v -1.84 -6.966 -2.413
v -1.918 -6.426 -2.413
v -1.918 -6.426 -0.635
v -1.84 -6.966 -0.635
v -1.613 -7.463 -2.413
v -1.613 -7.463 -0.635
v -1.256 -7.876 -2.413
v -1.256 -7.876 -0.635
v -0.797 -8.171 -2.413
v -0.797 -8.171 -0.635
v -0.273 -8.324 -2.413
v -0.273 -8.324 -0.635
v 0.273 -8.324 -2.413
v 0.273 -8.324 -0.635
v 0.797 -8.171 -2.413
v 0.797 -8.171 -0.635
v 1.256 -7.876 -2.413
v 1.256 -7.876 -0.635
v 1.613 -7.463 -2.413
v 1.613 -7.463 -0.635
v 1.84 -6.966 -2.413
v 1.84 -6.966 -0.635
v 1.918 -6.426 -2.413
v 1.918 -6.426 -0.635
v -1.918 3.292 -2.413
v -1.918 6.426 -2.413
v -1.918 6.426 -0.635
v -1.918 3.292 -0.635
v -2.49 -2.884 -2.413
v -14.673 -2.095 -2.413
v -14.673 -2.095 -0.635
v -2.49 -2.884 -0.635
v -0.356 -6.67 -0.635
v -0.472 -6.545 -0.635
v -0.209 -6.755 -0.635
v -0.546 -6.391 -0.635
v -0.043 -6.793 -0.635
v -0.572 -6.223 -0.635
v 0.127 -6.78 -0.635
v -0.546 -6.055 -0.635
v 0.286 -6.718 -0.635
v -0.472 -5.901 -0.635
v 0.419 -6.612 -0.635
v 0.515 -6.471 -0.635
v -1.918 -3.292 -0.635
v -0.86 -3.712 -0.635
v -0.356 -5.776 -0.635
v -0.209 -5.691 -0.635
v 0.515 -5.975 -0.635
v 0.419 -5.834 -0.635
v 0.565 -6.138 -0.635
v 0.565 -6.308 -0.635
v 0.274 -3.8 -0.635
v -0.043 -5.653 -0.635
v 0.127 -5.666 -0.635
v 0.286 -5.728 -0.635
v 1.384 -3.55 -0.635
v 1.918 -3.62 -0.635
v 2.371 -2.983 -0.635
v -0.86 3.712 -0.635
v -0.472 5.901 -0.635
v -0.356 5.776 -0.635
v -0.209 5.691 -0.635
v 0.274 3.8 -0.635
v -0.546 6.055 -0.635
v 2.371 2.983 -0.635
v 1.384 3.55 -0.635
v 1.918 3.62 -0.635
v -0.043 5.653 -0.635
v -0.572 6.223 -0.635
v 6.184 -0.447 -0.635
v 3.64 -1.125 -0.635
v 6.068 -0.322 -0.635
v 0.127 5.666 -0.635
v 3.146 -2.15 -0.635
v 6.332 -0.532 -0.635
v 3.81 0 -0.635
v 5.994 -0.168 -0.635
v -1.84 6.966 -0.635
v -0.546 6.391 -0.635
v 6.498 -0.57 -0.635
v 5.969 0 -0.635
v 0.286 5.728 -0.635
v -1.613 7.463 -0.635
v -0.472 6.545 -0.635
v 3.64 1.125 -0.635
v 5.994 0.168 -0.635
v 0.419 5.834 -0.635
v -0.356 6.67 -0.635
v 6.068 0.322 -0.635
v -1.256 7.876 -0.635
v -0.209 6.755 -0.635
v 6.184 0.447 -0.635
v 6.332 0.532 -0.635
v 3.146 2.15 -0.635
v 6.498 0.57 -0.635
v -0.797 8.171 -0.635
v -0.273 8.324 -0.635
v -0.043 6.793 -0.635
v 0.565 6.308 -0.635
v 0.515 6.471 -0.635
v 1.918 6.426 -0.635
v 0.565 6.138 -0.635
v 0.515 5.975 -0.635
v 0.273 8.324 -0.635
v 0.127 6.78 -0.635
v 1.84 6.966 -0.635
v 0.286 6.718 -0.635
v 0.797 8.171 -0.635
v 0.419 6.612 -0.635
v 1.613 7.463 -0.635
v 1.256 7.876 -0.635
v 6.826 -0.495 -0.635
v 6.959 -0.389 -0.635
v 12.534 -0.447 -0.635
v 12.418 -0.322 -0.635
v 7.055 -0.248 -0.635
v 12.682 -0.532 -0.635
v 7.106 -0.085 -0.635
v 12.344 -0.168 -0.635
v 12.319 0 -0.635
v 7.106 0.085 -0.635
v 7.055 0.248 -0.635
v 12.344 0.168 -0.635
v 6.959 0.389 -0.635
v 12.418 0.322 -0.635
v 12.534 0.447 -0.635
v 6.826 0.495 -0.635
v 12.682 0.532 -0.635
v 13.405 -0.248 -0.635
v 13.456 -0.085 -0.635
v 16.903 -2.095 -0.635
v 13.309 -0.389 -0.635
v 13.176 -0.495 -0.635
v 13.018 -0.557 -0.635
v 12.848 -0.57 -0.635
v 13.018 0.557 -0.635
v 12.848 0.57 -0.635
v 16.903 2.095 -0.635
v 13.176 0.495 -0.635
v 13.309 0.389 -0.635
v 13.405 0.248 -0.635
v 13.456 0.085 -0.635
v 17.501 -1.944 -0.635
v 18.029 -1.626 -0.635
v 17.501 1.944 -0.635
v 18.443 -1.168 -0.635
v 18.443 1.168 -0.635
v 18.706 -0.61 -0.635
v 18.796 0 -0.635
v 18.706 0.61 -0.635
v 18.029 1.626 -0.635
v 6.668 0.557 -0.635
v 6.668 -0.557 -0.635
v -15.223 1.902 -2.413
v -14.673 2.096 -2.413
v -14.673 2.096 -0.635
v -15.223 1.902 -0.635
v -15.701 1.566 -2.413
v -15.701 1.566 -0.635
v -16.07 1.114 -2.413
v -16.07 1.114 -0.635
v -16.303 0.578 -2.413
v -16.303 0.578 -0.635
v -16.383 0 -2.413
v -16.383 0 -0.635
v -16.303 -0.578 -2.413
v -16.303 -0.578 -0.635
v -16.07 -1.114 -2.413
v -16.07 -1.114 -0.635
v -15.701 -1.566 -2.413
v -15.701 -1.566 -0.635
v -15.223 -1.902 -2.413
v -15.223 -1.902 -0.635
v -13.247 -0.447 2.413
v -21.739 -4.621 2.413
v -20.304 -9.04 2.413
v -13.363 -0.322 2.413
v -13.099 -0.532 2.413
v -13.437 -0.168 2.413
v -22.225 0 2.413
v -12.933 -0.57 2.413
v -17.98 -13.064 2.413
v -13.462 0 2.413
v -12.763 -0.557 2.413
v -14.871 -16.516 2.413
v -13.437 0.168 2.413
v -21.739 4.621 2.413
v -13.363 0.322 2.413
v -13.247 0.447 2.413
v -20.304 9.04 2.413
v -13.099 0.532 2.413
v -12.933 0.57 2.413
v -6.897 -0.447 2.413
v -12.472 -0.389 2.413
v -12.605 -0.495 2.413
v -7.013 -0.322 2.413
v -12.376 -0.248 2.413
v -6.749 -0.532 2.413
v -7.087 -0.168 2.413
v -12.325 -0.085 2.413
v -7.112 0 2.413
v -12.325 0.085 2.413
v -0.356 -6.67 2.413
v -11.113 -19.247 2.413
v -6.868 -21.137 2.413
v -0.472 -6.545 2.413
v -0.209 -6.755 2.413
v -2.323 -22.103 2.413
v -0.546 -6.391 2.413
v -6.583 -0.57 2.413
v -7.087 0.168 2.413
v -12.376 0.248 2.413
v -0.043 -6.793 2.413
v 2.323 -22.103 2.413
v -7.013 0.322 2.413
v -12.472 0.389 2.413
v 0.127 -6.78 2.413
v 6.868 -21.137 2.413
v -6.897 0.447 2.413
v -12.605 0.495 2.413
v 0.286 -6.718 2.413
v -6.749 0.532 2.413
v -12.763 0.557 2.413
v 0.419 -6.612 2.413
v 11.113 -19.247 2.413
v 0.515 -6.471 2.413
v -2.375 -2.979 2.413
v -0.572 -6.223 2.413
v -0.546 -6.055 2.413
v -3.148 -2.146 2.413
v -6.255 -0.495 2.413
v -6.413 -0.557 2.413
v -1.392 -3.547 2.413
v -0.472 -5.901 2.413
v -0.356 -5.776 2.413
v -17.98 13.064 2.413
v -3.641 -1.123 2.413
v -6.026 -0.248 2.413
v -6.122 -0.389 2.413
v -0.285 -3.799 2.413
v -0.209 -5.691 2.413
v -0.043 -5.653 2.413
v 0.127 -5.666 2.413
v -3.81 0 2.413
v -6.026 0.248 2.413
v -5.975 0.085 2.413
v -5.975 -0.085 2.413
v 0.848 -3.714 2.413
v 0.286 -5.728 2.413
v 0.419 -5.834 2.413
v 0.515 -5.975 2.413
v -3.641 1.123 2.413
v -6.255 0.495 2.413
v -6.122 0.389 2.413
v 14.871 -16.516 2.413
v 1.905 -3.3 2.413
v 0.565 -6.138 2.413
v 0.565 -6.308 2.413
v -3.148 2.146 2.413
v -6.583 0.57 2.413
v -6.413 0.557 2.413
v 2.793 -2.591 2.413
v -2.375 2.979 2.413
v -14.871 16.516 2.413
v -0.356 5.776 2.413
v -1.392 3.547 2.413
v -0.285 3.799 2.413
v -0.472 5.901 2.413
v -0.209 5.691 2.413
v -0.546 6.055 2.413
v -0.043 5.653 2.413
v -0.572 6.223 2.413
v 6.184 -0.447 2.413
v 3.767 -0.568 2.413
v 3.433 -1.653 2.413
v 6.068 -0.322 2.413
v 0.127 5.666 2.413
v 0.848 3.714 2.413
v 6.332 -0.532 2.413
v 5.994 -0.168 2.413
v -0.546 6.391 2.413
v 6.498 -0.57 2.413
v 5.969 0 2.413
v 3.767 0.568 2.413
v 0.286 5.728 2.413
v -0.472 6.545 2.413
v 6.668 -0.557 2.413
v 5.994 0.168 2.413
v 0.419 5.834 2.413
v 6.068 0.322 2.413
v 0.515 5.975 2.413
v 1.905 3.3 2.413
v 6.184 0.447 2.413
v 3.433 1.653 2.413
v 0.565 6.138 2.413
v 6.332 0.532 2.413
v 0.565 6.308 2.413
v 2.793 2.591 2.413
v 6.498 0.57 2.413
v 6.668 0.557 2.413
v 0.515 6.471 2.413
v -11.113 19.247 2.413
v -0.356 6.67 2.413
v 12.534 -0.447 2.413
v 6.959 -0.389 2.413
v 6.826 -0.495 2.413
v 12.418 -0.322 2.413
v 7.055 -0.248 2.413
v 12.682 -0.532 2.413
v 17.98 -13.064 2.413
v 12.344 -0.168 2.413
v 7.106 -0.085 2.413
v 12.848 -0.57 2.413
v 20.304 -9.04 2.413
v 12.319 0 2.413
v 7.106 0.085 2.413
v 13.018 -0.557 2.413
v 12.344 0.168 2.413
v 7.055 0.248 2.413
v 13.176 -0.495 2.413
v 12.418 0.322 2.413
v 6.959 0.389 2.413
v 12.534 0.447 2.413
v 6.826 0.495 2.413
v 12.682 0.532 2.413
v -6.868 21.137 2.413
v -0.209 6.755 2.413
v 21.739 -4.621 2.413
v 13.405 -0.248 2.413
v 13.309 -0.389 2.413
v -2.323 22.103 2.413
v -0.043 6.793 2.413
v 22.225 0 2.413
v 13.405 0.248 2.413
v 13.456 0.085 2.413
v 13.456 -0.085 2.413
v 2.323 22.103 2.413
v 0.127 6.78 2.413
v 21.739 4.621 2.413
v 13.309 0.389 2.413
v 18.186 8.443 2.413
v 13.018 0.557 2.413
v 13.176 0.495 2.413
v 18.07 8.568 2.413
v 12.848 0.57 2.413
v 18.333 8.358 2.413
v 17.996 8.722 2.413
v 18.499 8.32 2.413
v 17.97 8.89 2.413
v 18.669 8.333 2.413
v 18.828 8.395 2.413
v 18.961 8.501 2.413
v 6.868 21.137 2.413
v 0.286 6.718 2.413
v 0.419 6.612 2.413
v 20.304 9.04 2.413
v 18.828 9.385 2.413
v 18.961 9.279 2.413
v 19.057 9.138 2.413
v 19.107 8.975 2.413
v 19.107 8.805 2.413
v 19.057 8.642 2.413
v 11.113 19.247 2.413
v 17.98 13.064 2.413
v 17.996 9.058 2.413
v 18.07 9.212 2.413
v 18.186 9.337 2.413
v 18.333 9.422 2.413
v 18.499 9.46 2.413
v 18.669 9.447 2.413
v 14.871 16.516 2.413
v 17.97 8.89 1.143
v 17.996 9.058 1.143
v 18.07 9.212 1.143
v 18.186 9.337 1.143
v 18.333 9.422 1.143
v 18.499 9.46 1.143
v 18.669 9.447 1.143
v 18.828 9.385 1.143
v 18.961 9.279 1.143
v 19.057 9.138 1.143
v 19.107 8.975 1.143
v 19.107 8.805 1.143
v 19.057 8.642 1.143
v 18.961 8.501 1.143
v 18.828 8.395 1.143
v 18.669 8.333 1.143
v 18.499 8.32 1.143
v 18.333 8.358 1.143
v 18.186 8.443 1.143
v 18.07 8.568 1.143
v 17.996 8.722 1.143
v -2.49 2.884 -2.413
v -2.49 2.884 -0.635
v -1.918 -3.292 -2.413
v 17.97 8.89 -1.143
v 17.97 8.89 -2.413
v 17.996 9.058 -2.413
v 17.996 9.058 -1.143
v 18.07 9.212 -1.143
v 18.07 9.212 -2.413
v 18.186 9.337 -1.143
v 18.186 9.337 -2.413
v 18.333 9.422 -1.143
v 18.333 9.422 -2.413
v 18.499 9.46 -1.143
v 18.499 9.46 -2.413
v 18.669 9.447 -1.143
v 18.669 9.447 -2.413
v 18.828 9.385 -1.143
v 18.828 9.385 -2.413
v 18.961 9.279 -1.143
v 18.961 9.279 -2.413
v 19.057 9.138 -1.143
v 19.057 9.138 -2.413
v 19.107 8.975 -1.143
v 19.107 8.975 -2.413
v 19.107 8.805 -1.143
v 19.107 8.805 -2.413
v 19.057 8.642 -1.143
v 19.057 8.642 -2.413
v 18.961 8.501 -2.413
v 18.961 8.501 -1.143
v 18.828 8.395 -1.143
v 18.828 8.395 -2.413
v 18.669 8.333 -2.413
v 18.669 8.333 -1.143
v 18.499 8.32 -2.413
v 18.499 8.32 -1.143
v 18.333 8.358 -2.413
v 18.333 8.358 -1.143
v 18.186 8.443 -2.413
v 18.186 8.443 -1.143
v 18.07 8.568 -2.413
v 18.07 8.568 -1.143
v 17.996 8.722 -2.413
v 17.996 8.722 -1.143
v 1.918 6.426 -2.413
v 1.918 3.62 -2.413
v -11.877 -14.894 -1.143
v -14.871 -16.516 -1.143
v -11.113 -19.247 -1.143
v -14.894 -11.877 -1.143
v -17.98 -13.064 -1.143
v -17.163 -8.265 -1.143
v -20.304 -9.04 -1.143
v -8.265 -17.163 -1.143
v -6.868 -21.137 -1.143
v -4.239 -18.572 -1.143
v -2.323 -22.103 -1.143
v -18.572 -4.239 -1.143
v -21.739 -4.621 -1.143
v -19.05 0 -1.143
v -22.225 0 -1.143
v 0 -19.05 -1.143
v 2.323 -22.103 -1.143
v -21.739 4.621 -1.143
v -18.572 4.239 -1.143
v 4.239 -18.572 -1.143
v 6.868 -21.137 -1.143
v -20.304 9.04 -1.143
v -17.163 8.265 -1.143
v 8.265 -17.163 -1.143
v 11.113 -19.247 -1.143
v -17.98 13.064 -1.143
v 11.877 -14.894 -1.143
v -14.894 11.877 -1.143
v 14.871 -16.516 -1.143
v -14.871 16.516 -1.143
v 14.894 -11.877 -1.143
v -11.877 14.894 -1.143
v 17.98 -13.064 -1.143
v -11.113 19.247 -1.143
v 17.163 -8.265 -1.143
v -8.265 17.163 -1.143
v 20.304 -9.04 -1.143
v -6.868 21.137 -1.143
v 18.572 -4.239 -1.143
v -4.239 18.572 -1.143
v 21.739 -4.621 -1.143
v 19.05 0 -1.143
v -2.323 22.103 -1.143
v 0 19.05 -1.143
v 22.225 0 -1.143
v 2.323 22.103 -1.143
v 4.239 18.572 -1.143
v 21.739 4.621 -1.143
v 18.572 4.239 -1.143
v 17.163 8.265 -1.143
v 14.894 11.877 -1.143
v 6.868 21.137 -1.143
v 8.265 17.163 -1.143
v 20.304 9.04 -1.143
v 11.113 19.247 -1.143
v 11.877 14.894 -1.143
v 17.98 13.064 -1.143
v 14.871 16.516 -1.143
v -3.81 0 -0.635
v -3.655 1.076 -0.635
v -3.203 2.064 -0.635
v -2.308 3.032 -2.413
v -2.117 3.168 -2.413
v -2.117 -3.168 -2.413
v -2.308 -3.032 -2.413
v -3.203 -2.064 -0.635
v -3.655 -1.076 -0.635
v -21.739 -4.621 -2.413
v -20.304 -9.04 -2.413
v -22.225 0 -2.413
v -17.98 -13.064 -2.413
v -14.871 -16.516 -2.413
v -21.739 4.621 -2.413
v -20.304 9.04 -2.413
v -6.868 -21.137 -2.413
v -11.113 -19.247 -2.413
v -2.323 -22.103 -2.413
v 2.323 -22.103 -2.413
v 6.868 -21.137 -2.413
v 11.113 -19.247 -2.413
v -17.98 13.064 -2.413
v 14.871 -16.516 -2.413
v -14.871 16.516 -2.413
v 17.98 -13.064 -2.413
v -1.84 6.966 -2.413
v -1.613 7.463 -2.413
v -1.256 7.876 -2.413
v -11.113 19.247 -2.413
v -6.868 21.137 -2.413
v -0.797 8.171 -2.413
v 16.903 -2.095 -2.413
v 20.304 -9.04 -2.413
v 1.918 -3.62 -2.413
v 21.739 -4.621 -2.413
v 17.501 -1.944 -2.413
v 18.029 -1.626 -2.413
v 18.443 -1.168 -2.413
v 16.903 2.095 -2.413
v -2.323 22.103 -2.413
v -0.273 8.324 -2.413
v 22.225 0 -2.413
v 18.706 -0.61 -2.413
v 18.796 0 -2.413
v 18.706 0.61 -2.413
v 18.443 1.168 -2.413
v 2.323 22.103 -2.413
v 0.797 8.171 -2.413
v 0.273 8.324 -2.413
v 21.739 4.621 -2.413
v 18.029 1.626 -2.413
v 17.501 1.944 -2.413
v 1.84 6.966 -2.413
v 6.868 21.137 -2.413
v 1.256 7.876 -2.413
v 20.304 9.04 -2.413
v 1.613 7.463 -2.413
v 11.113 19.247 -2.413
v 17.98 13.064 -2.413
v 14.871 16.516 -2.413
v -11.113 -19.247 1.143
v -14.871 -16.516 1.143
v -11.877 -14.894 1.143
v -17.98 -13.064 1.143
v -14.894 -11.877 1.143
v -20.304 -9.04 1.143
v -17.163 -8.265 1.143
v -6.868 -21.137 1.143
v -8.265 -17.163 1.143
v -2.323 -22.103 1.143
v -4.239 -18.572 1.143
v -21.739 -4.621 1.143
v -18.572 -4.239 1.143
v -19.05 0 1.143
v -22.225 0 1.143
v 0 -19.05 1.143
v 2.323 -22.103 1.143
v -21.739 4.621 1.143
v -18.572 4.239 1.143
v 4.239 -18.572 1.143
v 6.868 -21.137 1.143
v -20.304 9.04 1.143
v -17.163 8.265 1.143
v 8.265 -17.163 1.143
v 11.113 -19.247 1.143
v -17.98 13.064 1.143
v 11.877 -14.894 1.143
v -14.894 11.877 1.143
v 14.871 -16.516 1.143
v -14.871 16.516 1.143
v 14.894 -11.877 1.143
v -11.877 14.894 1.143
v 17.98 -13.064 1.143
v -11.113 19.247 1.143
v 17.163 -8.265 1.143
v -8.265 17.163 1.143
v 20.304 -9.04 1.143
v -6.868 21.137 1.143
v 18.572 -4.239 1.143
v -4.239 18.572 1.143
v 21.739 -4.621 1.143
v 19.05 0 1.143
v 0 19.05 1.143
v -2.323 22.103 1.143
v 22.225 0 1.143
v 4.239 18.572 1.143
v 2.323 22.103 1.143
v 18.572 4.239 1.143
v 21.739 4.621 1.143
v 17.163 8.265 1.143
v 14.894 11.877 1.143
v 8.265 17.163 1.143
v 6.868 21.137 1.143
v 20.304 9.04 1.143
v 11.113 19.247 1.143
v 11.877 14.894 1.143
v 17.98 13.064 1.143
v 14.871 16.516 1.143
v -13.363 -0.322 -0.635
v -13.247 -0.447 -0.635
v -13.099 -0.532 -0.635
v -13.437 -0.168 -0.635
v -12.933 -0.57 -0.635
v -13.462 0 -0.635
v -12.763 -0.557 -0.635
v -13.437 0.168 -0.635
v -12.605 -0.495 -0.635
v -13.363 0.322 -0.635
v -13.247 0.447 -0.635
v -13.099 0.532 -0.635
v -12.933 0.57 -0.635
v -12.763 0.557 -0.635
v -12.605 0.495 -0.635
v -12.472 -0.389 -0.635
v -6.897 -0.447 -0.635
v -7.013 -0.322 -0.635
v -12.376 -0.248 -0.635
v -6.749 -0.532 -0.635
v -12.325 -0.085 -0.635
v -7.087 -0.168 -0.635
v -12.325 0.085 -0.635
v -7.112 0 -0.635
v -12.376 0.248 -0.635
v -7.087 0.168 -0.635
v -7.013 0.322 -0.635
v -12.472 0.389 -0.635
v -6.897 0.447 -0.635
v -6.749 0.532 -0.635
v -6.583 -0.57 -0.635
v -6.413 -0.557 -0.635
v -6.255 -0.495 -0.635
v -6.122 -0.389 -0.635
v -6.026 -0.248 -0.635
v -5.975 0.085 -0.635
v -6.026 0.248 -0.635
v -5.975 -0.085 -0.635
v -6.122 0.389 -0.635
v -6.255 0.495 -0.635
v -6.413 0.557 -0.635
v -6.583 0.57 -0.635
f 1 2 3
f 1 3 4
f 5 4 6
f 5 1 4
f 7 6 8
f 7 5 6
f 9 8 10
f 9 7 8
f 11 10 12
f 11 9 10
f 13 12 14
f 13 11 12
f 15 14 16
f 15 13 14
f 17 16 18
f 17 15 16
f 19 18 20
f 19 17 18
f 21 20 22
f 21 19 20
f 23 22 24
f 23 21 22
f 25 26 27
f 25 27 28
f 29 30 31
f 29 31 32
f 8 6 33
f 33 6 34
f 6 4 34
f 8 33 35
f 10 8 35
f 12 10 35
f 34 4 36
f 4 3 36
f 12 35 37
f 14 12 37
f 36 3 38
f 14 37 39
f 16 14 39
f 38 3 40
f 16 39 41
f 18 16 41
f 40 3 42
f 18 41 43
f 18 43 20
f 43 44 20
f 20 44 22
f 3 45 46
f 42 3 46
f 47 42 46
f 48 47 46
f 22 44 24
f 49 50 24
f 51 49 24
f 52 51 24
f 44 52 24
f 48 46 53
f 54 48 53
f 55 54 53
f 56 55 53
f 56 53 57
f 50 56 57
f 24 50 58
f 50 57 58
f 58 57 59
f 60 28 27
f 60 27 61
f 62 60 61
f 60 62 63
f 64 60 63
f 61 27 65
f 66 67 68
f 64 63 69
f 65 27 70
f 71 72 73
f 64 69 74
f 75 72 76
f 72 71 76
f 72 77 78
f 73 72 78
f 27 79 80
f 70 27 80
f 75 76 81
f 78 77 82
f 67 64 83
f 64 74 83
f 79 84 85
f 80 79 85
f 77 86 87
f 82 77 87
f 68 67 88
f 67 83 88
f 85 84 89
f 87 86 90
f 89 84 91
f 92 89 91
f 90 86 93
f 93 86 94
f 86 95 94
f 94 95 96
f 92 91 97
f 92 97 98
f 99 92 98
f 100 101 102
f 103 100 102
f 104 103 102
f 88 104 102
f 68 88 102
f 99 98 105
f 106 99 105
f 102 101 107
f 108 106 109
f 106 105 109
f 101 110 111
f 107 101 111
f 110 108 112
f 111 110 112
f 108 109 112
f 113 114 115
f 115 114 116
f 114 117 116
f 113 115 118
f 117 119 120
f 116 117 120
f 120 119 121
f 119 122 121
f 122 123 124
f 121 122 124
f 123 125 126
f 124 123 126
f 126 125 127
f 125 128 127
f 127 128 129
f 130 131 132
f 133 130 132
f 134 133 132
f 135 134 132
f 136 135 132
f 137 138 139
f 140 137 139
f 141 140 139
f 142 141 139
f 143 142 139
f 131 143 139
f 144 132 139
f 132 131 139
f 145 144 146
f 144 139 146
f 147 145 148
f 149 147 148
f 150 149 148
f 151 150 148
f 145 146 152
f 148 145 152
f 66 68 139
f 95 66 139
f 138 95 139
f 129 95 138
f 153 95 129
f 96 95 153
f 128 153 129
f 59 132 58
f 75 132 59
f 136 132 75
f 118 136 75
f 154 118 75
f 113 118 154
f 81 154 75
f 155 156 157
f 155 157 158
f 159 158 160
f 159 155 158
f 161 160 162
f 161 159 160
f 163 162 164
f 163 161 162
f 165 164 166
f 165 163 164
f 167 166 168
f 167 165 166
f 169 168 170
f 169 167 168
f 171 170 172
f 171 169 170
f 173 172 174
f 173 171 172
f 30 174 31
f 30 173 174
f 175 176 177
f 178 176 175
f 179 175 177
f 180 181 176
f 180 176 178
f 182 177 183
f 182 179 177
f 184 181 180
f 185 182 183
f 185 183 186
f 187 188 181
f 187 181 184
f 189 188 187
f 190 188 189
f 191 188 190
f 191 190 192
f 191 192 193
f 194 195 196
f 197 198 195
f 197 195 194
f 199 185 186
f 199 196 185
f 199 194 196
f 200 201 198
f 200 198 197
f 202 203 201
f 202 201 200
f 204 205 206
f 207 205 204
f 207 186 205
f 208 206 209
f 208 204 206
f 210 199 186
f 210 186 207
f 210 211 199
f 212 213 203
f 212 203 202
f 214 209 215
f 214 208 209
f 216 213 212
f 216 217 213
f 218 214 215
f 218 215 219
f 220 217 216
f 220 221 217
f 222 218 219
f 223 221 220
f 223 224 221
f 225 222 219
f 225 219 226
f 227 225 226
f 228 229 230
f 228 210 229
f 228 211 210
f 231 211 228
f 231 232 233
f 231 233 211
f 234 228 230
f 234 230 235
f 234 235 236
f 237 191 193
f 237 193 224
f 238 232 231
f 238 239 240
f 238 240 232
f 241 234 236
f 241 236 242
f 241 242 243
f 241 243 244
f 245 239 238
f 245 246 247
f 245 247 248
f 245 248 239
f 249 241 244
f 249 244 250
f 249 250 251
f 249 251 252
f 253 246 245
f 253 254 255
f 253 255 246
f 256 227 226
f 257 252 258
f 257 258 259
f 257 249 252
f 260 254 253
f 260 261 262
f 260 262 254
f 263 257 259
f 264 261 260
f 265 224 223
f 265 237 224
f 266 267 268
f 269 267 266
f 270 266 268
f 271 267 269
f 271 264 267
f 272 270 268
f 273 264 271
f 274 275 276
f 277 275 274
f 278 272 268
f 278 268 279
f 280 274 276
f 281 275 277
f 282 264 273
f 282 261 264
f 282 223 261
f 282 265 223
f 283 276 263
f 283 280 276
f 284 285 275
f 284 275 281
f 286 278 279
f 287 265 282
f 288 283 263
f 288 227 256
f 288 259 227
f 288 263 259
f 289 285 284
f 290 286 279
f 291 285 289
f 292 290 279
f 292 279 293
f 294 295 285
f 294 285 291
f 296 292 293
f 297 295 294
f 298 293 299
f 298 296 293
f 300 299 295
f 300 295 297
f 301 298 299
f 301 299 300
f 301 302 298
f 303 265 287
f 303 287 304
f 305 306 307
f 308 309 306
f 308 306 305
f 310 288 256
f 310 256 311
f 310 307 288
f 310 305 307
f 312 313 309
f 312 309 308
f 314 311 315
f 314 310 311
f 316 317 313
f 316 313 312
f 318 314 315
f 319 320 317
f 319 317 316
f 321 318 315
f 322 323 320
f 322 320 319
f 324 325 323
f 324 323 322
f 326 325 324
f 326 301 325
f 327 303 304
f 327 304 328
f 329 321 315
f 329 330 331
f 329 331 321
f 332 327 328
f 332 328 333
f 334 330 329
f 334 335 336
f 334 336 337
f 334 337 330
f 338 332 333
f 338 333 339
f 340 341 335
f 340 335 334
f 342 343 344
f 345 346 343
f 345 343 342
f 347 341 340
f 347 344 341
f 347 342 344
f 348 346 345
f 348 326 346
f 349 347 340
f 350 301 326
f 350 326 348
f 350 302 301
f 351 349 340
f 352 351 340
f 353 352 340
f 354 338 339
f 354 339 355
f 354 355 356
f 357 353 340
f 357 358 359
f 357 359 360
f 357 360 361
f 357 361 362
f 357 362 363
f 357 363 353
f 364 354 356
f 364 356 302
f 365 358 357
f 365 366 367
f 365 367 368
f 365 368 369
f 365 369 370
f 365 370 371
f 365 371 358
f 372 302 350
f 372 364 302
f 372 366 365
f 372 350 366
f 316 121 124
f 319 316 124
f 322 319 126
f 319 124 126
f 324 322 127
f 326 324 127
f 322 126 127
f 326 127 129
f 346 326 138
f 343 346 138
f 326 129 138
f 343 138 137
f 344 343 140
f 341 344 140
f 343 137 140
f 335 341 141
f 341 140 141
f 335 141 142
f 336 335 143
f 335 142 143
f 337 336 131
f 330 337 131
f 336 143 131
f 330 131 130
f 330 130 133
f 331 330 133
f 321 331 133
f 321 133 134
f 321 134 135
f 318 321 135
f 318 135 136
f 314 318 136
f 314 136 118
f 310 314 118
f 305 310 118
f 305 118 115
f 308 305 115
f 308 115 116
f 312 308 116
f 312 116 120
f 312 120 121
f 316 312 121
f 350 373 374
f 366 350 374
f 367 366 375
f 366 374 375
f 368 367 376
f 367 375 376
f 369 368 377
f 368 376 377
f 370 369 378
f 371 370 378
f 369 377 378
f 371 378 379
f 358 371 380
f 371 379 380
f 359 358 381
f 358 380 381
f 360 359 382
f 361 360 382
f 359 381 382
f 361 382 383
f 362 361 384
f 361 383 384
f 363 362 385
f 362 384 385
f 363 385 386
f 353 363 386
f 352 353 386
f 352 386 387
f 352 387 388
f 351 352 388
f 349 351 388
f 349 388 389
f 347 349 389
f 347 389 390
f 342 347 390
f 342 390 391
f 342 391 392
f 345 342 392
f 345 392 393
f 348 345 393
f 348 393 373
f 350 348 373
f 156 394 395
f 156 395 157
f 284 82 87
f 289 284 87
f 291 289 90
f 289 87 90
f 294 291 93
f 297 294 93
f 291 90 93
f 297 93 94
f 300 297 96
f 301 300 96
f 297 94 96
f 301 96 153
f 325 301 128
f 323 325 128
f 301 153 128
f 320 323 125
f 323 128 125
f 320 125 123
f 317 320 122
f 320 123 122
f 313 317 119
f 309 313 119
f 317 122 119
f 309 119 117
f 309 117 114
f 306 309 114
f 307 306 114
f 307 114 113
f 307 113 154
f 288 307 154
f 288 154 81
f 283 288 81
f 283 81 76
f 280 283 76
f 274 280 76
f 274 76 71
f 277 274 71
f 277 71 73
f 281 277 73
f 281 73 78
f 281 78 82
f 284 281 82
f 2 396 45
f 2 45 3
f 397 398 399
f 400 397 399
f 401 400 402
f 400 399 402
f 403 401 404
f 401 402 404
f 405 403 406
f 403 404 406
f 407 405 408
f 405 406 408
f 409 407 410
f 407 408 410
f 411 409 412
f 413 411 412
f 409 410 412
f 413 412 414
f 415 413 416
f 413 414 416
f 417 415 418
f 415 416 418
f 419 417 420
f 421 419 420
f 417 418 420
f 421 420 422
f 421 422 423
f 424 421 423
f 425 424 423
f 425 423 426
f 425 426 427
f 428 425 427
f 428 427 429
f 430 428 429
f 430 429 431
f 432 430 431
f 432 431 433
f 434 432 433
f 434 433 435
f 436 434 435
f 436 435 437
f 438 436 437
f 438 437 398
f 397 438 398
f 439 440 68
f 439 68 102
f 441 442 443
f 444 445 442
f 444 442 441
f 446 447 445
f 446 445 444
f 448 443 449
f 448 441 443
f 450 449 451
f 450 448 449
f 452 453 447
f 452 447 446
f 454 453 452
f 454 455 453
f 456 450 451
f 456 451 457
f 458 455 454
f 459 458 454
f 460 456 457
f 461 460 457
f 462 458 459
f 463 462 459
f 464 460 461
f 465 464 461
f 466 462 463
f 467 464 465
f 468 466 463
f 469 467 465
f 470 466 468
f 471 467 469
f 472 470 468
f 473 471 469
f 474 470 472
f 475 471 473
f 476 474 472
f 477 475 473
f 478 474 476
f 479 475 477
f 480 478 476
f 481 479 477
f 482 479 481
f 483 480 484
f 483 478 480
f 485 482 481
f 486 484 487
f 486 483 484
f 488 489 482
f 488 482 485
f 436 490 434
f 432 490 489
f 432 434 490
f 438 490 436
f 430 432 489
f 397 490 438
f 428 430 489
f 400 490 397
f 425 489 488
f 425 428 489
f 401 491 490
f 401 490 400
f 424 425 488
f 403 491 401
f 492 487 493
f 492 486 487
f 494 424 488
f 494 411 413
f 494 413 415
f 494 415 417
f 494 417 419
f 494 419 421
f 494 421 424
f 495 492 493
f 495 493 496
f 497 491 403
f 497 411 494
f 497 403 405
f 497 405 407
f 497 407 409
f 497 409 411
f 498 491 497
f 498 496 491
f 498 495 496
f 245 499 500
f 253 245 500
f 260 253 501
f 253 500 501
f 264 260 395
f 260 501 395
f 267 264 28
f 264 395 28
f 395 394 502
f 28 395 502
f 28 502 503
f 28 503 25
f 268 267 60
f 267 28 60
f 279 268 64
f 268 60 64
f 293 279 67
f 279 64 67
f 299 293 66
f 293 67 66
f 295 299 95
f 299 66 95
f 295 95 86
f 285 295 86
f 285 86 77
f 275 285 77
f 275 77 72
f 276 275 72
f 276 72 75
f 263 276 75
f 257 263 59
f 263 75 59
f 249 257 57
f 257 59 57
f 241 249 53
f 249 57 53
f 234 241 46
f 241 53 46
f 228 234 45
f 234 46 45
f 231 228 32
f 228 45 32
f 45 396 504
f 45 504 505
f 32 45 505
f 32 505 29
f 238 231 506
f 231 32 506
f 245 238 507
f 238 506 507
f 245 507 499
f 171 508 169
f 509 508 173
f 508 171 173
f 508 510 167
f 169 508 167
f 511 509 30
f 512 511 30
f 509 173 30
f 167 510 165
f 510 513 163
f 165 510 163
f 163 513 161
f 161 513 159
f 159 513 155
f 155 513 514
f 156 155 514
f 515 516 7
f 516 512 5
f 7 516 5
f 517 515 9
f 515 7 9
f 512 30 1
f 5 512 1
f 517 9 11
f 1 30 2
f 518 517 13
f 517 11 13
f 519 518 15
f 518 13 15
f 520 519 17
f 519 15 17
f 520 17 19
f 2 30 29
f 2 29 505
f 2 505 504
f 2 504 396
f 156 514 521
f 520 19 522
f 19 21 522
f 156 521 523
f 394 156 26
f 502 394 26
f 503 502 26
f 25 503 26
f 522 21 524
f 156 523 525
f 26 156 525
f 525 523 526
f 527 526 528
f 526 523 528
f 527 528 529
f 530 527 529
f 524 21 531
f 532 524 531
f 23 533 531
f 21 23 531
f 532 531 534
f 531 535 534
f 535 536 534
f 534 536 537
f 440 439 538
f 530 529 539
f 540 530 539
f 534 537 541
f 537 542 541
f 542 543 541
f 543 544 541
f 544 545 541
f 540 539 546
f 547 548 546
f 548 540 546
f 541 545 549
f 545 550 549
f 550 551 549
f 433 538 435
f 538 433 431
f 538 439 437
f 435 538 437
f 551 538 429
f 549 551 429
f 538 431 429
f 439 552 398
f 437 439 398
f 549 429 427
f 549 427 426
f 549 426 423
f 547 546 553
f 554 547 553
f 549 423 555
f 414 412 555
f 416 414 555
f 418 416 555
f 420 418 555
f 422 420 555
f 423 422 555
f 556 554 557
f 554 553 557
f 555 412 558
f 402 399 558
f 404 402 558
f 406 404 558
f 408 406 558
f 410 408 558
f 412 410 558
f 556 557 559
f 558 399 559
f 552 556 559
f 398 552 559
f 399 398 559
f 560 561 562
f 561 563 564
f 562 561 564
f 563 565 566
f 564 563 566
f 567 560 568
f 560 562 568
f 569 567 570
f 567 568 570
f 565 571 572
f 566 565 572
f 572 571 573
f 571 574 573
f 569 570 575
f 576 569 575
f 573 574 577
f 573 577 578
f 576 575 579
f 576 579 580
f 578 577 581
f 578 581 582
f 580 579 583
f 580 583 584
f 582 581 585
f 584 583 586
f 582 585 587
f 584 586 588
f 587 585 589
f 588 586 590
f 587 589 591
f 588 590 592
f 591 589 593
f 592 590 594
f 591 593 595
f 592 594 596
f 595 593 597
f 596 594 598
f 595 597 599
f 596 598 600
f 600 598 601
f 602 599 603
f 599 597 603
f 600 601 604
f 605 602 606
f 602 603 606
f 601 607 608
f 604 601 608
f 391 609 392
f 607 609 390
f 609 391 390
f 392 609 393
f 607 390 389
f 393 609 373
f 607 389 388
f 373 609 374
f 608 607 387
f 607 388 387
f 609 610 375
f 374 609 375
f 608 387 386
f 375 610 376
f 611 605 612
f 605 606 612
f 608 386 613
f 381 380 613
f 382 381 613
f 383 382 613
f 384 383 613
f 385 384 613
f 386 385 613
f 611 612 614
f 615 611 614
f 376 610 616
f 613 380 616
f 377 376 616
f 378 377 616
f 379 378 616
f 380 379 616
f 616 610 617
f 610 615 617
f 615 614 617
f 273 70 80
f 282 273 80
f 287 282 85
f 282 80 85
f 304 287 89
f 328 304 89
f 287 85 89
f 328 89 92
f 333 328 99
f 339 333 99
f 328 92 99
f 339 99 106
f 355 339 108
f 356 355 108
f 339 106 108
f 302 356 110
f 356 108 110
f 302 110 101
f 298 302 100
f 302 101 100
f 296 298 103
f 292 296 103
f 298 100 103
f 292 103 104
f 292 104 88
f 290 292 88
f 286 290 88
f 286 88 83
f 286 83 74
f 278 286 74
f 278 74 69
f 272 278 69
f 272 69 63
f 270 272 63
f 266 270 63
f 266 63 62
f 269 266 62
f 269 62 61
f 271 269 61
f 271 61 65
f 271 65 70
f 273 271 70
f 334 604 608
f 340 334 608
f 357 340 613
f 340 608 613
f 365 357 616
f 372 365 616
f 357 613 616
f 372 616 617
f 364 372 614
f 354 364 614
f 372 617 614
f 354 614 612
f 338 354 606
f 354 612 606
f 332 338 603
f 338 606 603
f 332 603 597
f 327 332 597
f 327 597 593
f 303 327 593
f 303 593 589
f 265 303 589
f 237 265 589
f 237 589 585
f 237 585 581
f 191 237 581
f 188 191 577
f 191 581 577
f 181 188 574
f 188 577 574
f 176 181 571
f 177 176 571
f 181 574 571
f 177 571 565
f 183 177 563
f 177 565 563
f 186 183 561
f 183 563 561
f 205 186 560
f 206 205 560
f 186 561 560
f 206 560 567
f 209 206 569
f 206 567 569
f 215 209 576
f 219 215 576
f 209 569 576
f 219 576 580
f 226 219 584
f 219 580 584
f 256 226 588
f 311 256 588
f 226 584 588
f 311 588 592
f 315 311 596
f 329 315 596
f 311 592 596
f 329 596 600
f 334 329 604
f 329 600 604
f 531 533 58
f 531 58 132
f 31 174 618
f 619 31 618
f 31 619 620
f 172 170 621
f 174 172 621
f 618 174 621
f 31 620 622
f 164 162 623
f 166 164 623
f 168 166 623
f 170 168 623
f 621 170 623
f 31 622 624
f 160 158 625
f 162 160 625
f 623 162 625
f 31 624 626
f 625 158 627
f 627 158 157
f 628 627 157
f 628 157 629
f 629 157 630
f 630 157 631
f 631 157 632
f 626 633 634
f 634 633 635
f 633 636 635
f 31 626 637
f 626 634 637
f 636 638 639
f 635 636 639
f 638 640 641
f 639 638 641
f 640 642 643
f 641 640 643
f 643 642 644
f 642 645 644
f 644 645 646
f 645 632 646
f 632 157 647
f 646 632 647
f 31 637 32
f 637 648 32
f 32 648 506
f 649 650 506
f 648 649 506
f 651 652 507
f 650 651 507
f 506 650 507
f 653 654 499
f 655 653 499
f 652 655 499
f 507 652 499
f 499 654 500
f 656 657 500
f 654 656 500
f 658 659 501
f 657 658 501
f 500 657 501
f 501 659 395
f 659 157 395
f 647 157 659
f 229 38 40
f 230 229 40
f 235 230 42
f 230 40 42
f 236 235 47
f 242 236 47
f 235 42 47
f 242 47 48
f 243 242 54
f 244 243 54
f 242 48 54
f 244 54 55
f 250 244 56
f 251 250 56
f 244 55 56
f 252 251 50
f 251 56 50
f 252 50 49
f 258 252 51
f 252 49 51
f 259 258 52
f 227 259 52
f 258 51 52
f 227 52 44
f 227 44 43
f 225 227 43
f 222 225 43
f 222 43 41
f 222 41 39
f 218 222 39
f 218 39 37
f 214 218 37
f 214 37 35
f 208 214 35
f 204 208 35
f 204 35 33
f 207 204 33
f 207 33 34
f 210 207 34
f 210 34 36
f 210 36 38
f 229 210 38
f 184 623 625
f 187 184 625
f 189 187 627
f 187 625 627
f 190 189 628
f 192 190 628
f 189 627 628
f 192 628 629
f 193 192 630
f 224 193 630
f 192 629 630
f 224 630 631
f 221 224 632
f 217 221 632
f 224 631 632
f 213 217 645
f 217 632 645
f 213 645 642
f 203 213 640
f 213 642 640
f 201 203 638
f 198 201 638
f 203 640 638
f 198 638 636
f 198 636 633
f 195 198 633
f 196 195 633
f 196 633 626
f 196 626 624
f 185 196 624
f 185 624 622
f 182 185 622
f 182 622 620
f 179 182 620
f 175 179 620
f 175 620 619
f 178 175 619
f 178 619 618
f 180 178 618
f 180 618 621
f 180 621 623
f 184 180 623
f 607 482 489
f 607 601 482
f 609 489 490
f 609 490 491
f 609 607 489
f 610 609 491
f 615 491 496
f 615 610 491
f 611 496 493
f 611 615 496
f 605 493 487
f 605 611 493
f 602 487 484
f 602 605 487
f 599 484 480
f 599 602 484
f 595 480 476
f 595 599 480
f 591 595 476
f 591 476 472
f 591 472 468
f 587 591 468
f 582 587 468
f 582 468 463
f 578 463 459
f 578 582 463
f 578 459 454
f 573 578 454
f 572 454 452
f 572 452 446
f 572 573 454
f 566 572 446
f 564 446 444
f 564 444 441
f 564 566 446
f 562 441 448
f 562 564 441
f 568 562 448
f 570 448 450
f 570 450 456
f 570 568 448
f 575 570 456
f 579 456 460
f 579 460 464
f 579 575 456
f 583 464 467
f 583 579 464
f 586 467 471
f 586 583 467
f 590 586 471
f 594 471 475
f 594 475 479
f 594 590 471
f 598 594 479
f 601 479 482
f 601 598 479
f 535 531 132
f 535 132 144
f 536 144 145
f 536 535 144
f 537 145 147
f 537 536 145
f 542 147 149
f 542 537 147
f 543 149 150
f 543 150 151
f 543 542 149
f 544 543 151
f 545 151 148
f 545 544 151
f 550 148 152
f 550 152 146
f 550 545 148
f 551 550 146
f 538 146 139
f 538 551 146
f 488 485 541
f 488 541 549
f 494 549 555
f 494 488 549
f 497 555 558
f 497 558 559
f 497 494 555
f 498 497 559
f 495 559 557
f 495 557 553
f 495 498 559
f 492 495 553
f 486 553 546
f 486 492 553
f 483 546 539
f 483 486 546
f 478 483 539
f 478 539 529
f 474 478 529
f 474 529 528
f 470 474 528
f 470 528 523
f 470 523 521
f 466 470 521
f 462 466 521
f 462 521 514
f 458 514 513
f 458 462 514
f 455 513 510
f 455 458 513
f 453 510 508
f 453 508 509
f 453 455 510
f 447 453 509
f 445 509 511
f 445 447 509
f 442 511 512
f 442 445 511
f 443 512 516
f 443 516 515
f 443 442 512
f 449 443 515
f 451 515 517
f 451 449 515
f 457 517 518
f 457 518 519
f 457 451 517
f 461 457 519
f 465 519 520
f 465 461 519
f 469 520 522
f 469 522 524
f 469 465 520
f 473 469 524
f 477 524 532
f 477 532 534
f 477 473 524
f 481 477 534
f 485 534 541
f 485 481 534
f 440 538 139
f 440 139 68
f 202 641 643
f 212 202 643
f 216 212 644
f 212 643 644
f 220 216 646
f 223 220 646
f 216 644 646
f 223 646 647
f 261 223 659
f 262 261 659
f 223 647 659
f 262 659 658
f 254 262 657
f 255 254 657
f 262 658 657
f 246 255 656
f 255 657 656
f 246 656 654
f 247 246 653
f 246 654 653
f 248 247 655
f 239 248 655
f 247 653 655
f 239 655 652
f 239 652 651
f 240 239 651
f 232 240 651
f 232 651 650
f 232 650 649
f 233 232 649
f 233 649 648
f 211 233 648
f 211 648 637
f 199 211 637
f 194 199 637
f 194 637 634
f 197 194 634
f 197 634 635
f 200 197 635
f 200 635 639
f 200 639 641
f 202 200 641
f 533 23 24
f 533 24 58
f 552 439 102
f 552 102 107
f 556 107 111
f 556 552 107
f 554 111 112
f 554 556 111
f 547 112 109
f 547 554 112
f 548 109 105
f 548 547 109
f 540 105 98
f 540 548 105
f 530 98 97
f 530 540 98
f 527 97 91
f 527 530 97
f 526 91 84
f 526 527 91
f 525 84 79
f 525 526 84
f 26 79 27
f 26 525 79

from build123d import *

# Parameters (mm, degrees)
SKETCH1_R           = 19.05
BOSS_EXTRUDE1_DEPTH = 1.143
SKETCH2_R           = 22.225
BOSS_EXTRUDE2_DEPTH = 1.27
SKETCH3_R           = 3.556
CUT_EXTRUDE1_DEPTH  = 5.826
SKETCH4_R           = 0.5715
CUT_EXTRUDE3_DEPTH  = 5.826
SKETCH5_R           = 0.5715
CUT_EXTRUDE4_DEPTH  = 5.826
CUT_EXTRUDE5_DEPTH  = 1.778
SKETCH10_R          = 0.5715
CUT_EXTRUDE6_DEPTH  = 5.826
SKETCH11_R          = 3.81
CUT_EXTRUDE7_DEPTH  = 5.826


with BuildPart() as part:
    # Sketch1 → Boss-Extrude1 (new body, symmetric)
    with BuildSketch(Plane.XY):
        Circle(SKETCH1_R)
    extrude(amount=BOSS_EXTRUDE1_DEPTH, both=True)

    # Sketch2 → Boss-Extrude2 (add)
    with BuildSketch(Plane.XY.offset(1.143)):
        Circle(SKETCH2_R)
    boss_extrude2 = extrude(amount=BOSS_EXTRUDE2_DEPTH)

    # Mirror1: Boss-Extrude2 across plane
    add(boss_extrude2.mirror(Plane.XY))

    # Sketch3 → Cut-Extrude1 (cut, through all)
    with BuildSketch(Plane(origin=(0, 0, -2.413), x_dir=(-1, 0, 0), z_dir=(0, 0, -1))):
        Circle(SKETCH3_R)
    extrude(amount=-CUT_EXTRUDE1_DEPTH, mode=Mode.SUBTRACT)

    # Sketch4 → Cut-Extrude3 (cut, through all)
    with BuildSketch(Plane(origin=(0, 0, -2.413), x_dir=(-1, 0, 0), z_dir=(0, 0, -1))):
        with Locations((12.8905, 0)):
            Circle(SKETCH4_R)
        with Locations((6.5405, 0)):
            Circle(SKETCH4_R)
        with Locations((-12.8905, 0)):
            Circle(SKETCH4_R)
        with Locations((-6.5405, 0)):
            Circle(SKETCH4_R)
    extrude(amount=-CUT_EXTRUDE3_DEPTH, mode=Mode.SUBTRACT)

    # Sketch5 → Cut-Extrude4 (cut, through all)
    with BuildSketch(Plane(origin=(0, 0, -2.413), x_dir=(-1, 0, 0), z_dir=(0, 0, -1))):
        with Locations((-18.542, 8.89)):
            Circle(SKETCH5_R)
    extrude(amount=-CUT_EXTRUDE4_DEPTH, mode=Mode.SUBTRACT)

    # Sketch7 → Cut-Extrude5 (cut)
    with BuildSketch(Plane(origin=(0, 0, -2.413), x_dir=(-1, 0, 0), z_dir=(0, 0, -1))):
        with BuildLine():
            Line((-1.9177, 3.6195), (-1.9177, 6.4262))
            ThreePointArc((-1.9177, 6.4262), (0, 8.3439), (1.9177, 6.4262))
            Line((1.9177, 6.4262), (1.9177, 2.921))
            Line((1.9177, 2.921), (14.672772863, 2.0955))
            ThreePointArc((14.672772863, 2.0955), (16.383, 0), (14.672772863, -2.0955))
            Line((14.672772863, -2.0955), (1.9177, -2.921))
            Line((1.9177, -2.921), (1.9177, -6.4262))
            ThreePointArc((1.9177, -6.4262), (0, -8.3439), (-1.9177, -6.4262))
            Line((-1.9177, -6.4262), (-1.9177, -3.6195))
            Line((-1.9177, -3.6195), (-16.902805323, -2.0955))
            ThreePointArc((-16.902805323, -2.0955), (-18.796, 0), (-16.902805323, 2.0955))
            Line((-16.902805323, 2.0955), (-1.9177, 3.6195))
        make_face()
    extrude(amount=-CUT_EXTRUDE5_DEPTH, mode=Mode.SUBTRACT)

    # Sketch10 → Cut-Extrude6 (cut, through all)
    with BuildSketch(Plane(origin=(0, 0, -2.413), x_dir=(-1, 0, 0), z_dir=(0, 0, -1))):
        with Locations((0, -6.223)):
            Circle(SKETCH10_R)
        with Locations((0, 6.223)):
            Circle(SKETCH10_R)
    extrude(amount=-CUT_EXTRUDE6_DEPTH, mode=Mode.SUBTRACT)

    # Sketch11 → Cut-Extrude7 (cut, through all)
    with BuildSketch(Plane(origin=(0, 0, -2.413), x_dir=(-1, 0, 0), z_dir=(0, 0, -1))):
        Circle(SKETCH11_R)
    extrude(amount=-CUT_EXTRUDE7_DEPTH, mode=Mode.SUBTRACT)


solid = part.part
